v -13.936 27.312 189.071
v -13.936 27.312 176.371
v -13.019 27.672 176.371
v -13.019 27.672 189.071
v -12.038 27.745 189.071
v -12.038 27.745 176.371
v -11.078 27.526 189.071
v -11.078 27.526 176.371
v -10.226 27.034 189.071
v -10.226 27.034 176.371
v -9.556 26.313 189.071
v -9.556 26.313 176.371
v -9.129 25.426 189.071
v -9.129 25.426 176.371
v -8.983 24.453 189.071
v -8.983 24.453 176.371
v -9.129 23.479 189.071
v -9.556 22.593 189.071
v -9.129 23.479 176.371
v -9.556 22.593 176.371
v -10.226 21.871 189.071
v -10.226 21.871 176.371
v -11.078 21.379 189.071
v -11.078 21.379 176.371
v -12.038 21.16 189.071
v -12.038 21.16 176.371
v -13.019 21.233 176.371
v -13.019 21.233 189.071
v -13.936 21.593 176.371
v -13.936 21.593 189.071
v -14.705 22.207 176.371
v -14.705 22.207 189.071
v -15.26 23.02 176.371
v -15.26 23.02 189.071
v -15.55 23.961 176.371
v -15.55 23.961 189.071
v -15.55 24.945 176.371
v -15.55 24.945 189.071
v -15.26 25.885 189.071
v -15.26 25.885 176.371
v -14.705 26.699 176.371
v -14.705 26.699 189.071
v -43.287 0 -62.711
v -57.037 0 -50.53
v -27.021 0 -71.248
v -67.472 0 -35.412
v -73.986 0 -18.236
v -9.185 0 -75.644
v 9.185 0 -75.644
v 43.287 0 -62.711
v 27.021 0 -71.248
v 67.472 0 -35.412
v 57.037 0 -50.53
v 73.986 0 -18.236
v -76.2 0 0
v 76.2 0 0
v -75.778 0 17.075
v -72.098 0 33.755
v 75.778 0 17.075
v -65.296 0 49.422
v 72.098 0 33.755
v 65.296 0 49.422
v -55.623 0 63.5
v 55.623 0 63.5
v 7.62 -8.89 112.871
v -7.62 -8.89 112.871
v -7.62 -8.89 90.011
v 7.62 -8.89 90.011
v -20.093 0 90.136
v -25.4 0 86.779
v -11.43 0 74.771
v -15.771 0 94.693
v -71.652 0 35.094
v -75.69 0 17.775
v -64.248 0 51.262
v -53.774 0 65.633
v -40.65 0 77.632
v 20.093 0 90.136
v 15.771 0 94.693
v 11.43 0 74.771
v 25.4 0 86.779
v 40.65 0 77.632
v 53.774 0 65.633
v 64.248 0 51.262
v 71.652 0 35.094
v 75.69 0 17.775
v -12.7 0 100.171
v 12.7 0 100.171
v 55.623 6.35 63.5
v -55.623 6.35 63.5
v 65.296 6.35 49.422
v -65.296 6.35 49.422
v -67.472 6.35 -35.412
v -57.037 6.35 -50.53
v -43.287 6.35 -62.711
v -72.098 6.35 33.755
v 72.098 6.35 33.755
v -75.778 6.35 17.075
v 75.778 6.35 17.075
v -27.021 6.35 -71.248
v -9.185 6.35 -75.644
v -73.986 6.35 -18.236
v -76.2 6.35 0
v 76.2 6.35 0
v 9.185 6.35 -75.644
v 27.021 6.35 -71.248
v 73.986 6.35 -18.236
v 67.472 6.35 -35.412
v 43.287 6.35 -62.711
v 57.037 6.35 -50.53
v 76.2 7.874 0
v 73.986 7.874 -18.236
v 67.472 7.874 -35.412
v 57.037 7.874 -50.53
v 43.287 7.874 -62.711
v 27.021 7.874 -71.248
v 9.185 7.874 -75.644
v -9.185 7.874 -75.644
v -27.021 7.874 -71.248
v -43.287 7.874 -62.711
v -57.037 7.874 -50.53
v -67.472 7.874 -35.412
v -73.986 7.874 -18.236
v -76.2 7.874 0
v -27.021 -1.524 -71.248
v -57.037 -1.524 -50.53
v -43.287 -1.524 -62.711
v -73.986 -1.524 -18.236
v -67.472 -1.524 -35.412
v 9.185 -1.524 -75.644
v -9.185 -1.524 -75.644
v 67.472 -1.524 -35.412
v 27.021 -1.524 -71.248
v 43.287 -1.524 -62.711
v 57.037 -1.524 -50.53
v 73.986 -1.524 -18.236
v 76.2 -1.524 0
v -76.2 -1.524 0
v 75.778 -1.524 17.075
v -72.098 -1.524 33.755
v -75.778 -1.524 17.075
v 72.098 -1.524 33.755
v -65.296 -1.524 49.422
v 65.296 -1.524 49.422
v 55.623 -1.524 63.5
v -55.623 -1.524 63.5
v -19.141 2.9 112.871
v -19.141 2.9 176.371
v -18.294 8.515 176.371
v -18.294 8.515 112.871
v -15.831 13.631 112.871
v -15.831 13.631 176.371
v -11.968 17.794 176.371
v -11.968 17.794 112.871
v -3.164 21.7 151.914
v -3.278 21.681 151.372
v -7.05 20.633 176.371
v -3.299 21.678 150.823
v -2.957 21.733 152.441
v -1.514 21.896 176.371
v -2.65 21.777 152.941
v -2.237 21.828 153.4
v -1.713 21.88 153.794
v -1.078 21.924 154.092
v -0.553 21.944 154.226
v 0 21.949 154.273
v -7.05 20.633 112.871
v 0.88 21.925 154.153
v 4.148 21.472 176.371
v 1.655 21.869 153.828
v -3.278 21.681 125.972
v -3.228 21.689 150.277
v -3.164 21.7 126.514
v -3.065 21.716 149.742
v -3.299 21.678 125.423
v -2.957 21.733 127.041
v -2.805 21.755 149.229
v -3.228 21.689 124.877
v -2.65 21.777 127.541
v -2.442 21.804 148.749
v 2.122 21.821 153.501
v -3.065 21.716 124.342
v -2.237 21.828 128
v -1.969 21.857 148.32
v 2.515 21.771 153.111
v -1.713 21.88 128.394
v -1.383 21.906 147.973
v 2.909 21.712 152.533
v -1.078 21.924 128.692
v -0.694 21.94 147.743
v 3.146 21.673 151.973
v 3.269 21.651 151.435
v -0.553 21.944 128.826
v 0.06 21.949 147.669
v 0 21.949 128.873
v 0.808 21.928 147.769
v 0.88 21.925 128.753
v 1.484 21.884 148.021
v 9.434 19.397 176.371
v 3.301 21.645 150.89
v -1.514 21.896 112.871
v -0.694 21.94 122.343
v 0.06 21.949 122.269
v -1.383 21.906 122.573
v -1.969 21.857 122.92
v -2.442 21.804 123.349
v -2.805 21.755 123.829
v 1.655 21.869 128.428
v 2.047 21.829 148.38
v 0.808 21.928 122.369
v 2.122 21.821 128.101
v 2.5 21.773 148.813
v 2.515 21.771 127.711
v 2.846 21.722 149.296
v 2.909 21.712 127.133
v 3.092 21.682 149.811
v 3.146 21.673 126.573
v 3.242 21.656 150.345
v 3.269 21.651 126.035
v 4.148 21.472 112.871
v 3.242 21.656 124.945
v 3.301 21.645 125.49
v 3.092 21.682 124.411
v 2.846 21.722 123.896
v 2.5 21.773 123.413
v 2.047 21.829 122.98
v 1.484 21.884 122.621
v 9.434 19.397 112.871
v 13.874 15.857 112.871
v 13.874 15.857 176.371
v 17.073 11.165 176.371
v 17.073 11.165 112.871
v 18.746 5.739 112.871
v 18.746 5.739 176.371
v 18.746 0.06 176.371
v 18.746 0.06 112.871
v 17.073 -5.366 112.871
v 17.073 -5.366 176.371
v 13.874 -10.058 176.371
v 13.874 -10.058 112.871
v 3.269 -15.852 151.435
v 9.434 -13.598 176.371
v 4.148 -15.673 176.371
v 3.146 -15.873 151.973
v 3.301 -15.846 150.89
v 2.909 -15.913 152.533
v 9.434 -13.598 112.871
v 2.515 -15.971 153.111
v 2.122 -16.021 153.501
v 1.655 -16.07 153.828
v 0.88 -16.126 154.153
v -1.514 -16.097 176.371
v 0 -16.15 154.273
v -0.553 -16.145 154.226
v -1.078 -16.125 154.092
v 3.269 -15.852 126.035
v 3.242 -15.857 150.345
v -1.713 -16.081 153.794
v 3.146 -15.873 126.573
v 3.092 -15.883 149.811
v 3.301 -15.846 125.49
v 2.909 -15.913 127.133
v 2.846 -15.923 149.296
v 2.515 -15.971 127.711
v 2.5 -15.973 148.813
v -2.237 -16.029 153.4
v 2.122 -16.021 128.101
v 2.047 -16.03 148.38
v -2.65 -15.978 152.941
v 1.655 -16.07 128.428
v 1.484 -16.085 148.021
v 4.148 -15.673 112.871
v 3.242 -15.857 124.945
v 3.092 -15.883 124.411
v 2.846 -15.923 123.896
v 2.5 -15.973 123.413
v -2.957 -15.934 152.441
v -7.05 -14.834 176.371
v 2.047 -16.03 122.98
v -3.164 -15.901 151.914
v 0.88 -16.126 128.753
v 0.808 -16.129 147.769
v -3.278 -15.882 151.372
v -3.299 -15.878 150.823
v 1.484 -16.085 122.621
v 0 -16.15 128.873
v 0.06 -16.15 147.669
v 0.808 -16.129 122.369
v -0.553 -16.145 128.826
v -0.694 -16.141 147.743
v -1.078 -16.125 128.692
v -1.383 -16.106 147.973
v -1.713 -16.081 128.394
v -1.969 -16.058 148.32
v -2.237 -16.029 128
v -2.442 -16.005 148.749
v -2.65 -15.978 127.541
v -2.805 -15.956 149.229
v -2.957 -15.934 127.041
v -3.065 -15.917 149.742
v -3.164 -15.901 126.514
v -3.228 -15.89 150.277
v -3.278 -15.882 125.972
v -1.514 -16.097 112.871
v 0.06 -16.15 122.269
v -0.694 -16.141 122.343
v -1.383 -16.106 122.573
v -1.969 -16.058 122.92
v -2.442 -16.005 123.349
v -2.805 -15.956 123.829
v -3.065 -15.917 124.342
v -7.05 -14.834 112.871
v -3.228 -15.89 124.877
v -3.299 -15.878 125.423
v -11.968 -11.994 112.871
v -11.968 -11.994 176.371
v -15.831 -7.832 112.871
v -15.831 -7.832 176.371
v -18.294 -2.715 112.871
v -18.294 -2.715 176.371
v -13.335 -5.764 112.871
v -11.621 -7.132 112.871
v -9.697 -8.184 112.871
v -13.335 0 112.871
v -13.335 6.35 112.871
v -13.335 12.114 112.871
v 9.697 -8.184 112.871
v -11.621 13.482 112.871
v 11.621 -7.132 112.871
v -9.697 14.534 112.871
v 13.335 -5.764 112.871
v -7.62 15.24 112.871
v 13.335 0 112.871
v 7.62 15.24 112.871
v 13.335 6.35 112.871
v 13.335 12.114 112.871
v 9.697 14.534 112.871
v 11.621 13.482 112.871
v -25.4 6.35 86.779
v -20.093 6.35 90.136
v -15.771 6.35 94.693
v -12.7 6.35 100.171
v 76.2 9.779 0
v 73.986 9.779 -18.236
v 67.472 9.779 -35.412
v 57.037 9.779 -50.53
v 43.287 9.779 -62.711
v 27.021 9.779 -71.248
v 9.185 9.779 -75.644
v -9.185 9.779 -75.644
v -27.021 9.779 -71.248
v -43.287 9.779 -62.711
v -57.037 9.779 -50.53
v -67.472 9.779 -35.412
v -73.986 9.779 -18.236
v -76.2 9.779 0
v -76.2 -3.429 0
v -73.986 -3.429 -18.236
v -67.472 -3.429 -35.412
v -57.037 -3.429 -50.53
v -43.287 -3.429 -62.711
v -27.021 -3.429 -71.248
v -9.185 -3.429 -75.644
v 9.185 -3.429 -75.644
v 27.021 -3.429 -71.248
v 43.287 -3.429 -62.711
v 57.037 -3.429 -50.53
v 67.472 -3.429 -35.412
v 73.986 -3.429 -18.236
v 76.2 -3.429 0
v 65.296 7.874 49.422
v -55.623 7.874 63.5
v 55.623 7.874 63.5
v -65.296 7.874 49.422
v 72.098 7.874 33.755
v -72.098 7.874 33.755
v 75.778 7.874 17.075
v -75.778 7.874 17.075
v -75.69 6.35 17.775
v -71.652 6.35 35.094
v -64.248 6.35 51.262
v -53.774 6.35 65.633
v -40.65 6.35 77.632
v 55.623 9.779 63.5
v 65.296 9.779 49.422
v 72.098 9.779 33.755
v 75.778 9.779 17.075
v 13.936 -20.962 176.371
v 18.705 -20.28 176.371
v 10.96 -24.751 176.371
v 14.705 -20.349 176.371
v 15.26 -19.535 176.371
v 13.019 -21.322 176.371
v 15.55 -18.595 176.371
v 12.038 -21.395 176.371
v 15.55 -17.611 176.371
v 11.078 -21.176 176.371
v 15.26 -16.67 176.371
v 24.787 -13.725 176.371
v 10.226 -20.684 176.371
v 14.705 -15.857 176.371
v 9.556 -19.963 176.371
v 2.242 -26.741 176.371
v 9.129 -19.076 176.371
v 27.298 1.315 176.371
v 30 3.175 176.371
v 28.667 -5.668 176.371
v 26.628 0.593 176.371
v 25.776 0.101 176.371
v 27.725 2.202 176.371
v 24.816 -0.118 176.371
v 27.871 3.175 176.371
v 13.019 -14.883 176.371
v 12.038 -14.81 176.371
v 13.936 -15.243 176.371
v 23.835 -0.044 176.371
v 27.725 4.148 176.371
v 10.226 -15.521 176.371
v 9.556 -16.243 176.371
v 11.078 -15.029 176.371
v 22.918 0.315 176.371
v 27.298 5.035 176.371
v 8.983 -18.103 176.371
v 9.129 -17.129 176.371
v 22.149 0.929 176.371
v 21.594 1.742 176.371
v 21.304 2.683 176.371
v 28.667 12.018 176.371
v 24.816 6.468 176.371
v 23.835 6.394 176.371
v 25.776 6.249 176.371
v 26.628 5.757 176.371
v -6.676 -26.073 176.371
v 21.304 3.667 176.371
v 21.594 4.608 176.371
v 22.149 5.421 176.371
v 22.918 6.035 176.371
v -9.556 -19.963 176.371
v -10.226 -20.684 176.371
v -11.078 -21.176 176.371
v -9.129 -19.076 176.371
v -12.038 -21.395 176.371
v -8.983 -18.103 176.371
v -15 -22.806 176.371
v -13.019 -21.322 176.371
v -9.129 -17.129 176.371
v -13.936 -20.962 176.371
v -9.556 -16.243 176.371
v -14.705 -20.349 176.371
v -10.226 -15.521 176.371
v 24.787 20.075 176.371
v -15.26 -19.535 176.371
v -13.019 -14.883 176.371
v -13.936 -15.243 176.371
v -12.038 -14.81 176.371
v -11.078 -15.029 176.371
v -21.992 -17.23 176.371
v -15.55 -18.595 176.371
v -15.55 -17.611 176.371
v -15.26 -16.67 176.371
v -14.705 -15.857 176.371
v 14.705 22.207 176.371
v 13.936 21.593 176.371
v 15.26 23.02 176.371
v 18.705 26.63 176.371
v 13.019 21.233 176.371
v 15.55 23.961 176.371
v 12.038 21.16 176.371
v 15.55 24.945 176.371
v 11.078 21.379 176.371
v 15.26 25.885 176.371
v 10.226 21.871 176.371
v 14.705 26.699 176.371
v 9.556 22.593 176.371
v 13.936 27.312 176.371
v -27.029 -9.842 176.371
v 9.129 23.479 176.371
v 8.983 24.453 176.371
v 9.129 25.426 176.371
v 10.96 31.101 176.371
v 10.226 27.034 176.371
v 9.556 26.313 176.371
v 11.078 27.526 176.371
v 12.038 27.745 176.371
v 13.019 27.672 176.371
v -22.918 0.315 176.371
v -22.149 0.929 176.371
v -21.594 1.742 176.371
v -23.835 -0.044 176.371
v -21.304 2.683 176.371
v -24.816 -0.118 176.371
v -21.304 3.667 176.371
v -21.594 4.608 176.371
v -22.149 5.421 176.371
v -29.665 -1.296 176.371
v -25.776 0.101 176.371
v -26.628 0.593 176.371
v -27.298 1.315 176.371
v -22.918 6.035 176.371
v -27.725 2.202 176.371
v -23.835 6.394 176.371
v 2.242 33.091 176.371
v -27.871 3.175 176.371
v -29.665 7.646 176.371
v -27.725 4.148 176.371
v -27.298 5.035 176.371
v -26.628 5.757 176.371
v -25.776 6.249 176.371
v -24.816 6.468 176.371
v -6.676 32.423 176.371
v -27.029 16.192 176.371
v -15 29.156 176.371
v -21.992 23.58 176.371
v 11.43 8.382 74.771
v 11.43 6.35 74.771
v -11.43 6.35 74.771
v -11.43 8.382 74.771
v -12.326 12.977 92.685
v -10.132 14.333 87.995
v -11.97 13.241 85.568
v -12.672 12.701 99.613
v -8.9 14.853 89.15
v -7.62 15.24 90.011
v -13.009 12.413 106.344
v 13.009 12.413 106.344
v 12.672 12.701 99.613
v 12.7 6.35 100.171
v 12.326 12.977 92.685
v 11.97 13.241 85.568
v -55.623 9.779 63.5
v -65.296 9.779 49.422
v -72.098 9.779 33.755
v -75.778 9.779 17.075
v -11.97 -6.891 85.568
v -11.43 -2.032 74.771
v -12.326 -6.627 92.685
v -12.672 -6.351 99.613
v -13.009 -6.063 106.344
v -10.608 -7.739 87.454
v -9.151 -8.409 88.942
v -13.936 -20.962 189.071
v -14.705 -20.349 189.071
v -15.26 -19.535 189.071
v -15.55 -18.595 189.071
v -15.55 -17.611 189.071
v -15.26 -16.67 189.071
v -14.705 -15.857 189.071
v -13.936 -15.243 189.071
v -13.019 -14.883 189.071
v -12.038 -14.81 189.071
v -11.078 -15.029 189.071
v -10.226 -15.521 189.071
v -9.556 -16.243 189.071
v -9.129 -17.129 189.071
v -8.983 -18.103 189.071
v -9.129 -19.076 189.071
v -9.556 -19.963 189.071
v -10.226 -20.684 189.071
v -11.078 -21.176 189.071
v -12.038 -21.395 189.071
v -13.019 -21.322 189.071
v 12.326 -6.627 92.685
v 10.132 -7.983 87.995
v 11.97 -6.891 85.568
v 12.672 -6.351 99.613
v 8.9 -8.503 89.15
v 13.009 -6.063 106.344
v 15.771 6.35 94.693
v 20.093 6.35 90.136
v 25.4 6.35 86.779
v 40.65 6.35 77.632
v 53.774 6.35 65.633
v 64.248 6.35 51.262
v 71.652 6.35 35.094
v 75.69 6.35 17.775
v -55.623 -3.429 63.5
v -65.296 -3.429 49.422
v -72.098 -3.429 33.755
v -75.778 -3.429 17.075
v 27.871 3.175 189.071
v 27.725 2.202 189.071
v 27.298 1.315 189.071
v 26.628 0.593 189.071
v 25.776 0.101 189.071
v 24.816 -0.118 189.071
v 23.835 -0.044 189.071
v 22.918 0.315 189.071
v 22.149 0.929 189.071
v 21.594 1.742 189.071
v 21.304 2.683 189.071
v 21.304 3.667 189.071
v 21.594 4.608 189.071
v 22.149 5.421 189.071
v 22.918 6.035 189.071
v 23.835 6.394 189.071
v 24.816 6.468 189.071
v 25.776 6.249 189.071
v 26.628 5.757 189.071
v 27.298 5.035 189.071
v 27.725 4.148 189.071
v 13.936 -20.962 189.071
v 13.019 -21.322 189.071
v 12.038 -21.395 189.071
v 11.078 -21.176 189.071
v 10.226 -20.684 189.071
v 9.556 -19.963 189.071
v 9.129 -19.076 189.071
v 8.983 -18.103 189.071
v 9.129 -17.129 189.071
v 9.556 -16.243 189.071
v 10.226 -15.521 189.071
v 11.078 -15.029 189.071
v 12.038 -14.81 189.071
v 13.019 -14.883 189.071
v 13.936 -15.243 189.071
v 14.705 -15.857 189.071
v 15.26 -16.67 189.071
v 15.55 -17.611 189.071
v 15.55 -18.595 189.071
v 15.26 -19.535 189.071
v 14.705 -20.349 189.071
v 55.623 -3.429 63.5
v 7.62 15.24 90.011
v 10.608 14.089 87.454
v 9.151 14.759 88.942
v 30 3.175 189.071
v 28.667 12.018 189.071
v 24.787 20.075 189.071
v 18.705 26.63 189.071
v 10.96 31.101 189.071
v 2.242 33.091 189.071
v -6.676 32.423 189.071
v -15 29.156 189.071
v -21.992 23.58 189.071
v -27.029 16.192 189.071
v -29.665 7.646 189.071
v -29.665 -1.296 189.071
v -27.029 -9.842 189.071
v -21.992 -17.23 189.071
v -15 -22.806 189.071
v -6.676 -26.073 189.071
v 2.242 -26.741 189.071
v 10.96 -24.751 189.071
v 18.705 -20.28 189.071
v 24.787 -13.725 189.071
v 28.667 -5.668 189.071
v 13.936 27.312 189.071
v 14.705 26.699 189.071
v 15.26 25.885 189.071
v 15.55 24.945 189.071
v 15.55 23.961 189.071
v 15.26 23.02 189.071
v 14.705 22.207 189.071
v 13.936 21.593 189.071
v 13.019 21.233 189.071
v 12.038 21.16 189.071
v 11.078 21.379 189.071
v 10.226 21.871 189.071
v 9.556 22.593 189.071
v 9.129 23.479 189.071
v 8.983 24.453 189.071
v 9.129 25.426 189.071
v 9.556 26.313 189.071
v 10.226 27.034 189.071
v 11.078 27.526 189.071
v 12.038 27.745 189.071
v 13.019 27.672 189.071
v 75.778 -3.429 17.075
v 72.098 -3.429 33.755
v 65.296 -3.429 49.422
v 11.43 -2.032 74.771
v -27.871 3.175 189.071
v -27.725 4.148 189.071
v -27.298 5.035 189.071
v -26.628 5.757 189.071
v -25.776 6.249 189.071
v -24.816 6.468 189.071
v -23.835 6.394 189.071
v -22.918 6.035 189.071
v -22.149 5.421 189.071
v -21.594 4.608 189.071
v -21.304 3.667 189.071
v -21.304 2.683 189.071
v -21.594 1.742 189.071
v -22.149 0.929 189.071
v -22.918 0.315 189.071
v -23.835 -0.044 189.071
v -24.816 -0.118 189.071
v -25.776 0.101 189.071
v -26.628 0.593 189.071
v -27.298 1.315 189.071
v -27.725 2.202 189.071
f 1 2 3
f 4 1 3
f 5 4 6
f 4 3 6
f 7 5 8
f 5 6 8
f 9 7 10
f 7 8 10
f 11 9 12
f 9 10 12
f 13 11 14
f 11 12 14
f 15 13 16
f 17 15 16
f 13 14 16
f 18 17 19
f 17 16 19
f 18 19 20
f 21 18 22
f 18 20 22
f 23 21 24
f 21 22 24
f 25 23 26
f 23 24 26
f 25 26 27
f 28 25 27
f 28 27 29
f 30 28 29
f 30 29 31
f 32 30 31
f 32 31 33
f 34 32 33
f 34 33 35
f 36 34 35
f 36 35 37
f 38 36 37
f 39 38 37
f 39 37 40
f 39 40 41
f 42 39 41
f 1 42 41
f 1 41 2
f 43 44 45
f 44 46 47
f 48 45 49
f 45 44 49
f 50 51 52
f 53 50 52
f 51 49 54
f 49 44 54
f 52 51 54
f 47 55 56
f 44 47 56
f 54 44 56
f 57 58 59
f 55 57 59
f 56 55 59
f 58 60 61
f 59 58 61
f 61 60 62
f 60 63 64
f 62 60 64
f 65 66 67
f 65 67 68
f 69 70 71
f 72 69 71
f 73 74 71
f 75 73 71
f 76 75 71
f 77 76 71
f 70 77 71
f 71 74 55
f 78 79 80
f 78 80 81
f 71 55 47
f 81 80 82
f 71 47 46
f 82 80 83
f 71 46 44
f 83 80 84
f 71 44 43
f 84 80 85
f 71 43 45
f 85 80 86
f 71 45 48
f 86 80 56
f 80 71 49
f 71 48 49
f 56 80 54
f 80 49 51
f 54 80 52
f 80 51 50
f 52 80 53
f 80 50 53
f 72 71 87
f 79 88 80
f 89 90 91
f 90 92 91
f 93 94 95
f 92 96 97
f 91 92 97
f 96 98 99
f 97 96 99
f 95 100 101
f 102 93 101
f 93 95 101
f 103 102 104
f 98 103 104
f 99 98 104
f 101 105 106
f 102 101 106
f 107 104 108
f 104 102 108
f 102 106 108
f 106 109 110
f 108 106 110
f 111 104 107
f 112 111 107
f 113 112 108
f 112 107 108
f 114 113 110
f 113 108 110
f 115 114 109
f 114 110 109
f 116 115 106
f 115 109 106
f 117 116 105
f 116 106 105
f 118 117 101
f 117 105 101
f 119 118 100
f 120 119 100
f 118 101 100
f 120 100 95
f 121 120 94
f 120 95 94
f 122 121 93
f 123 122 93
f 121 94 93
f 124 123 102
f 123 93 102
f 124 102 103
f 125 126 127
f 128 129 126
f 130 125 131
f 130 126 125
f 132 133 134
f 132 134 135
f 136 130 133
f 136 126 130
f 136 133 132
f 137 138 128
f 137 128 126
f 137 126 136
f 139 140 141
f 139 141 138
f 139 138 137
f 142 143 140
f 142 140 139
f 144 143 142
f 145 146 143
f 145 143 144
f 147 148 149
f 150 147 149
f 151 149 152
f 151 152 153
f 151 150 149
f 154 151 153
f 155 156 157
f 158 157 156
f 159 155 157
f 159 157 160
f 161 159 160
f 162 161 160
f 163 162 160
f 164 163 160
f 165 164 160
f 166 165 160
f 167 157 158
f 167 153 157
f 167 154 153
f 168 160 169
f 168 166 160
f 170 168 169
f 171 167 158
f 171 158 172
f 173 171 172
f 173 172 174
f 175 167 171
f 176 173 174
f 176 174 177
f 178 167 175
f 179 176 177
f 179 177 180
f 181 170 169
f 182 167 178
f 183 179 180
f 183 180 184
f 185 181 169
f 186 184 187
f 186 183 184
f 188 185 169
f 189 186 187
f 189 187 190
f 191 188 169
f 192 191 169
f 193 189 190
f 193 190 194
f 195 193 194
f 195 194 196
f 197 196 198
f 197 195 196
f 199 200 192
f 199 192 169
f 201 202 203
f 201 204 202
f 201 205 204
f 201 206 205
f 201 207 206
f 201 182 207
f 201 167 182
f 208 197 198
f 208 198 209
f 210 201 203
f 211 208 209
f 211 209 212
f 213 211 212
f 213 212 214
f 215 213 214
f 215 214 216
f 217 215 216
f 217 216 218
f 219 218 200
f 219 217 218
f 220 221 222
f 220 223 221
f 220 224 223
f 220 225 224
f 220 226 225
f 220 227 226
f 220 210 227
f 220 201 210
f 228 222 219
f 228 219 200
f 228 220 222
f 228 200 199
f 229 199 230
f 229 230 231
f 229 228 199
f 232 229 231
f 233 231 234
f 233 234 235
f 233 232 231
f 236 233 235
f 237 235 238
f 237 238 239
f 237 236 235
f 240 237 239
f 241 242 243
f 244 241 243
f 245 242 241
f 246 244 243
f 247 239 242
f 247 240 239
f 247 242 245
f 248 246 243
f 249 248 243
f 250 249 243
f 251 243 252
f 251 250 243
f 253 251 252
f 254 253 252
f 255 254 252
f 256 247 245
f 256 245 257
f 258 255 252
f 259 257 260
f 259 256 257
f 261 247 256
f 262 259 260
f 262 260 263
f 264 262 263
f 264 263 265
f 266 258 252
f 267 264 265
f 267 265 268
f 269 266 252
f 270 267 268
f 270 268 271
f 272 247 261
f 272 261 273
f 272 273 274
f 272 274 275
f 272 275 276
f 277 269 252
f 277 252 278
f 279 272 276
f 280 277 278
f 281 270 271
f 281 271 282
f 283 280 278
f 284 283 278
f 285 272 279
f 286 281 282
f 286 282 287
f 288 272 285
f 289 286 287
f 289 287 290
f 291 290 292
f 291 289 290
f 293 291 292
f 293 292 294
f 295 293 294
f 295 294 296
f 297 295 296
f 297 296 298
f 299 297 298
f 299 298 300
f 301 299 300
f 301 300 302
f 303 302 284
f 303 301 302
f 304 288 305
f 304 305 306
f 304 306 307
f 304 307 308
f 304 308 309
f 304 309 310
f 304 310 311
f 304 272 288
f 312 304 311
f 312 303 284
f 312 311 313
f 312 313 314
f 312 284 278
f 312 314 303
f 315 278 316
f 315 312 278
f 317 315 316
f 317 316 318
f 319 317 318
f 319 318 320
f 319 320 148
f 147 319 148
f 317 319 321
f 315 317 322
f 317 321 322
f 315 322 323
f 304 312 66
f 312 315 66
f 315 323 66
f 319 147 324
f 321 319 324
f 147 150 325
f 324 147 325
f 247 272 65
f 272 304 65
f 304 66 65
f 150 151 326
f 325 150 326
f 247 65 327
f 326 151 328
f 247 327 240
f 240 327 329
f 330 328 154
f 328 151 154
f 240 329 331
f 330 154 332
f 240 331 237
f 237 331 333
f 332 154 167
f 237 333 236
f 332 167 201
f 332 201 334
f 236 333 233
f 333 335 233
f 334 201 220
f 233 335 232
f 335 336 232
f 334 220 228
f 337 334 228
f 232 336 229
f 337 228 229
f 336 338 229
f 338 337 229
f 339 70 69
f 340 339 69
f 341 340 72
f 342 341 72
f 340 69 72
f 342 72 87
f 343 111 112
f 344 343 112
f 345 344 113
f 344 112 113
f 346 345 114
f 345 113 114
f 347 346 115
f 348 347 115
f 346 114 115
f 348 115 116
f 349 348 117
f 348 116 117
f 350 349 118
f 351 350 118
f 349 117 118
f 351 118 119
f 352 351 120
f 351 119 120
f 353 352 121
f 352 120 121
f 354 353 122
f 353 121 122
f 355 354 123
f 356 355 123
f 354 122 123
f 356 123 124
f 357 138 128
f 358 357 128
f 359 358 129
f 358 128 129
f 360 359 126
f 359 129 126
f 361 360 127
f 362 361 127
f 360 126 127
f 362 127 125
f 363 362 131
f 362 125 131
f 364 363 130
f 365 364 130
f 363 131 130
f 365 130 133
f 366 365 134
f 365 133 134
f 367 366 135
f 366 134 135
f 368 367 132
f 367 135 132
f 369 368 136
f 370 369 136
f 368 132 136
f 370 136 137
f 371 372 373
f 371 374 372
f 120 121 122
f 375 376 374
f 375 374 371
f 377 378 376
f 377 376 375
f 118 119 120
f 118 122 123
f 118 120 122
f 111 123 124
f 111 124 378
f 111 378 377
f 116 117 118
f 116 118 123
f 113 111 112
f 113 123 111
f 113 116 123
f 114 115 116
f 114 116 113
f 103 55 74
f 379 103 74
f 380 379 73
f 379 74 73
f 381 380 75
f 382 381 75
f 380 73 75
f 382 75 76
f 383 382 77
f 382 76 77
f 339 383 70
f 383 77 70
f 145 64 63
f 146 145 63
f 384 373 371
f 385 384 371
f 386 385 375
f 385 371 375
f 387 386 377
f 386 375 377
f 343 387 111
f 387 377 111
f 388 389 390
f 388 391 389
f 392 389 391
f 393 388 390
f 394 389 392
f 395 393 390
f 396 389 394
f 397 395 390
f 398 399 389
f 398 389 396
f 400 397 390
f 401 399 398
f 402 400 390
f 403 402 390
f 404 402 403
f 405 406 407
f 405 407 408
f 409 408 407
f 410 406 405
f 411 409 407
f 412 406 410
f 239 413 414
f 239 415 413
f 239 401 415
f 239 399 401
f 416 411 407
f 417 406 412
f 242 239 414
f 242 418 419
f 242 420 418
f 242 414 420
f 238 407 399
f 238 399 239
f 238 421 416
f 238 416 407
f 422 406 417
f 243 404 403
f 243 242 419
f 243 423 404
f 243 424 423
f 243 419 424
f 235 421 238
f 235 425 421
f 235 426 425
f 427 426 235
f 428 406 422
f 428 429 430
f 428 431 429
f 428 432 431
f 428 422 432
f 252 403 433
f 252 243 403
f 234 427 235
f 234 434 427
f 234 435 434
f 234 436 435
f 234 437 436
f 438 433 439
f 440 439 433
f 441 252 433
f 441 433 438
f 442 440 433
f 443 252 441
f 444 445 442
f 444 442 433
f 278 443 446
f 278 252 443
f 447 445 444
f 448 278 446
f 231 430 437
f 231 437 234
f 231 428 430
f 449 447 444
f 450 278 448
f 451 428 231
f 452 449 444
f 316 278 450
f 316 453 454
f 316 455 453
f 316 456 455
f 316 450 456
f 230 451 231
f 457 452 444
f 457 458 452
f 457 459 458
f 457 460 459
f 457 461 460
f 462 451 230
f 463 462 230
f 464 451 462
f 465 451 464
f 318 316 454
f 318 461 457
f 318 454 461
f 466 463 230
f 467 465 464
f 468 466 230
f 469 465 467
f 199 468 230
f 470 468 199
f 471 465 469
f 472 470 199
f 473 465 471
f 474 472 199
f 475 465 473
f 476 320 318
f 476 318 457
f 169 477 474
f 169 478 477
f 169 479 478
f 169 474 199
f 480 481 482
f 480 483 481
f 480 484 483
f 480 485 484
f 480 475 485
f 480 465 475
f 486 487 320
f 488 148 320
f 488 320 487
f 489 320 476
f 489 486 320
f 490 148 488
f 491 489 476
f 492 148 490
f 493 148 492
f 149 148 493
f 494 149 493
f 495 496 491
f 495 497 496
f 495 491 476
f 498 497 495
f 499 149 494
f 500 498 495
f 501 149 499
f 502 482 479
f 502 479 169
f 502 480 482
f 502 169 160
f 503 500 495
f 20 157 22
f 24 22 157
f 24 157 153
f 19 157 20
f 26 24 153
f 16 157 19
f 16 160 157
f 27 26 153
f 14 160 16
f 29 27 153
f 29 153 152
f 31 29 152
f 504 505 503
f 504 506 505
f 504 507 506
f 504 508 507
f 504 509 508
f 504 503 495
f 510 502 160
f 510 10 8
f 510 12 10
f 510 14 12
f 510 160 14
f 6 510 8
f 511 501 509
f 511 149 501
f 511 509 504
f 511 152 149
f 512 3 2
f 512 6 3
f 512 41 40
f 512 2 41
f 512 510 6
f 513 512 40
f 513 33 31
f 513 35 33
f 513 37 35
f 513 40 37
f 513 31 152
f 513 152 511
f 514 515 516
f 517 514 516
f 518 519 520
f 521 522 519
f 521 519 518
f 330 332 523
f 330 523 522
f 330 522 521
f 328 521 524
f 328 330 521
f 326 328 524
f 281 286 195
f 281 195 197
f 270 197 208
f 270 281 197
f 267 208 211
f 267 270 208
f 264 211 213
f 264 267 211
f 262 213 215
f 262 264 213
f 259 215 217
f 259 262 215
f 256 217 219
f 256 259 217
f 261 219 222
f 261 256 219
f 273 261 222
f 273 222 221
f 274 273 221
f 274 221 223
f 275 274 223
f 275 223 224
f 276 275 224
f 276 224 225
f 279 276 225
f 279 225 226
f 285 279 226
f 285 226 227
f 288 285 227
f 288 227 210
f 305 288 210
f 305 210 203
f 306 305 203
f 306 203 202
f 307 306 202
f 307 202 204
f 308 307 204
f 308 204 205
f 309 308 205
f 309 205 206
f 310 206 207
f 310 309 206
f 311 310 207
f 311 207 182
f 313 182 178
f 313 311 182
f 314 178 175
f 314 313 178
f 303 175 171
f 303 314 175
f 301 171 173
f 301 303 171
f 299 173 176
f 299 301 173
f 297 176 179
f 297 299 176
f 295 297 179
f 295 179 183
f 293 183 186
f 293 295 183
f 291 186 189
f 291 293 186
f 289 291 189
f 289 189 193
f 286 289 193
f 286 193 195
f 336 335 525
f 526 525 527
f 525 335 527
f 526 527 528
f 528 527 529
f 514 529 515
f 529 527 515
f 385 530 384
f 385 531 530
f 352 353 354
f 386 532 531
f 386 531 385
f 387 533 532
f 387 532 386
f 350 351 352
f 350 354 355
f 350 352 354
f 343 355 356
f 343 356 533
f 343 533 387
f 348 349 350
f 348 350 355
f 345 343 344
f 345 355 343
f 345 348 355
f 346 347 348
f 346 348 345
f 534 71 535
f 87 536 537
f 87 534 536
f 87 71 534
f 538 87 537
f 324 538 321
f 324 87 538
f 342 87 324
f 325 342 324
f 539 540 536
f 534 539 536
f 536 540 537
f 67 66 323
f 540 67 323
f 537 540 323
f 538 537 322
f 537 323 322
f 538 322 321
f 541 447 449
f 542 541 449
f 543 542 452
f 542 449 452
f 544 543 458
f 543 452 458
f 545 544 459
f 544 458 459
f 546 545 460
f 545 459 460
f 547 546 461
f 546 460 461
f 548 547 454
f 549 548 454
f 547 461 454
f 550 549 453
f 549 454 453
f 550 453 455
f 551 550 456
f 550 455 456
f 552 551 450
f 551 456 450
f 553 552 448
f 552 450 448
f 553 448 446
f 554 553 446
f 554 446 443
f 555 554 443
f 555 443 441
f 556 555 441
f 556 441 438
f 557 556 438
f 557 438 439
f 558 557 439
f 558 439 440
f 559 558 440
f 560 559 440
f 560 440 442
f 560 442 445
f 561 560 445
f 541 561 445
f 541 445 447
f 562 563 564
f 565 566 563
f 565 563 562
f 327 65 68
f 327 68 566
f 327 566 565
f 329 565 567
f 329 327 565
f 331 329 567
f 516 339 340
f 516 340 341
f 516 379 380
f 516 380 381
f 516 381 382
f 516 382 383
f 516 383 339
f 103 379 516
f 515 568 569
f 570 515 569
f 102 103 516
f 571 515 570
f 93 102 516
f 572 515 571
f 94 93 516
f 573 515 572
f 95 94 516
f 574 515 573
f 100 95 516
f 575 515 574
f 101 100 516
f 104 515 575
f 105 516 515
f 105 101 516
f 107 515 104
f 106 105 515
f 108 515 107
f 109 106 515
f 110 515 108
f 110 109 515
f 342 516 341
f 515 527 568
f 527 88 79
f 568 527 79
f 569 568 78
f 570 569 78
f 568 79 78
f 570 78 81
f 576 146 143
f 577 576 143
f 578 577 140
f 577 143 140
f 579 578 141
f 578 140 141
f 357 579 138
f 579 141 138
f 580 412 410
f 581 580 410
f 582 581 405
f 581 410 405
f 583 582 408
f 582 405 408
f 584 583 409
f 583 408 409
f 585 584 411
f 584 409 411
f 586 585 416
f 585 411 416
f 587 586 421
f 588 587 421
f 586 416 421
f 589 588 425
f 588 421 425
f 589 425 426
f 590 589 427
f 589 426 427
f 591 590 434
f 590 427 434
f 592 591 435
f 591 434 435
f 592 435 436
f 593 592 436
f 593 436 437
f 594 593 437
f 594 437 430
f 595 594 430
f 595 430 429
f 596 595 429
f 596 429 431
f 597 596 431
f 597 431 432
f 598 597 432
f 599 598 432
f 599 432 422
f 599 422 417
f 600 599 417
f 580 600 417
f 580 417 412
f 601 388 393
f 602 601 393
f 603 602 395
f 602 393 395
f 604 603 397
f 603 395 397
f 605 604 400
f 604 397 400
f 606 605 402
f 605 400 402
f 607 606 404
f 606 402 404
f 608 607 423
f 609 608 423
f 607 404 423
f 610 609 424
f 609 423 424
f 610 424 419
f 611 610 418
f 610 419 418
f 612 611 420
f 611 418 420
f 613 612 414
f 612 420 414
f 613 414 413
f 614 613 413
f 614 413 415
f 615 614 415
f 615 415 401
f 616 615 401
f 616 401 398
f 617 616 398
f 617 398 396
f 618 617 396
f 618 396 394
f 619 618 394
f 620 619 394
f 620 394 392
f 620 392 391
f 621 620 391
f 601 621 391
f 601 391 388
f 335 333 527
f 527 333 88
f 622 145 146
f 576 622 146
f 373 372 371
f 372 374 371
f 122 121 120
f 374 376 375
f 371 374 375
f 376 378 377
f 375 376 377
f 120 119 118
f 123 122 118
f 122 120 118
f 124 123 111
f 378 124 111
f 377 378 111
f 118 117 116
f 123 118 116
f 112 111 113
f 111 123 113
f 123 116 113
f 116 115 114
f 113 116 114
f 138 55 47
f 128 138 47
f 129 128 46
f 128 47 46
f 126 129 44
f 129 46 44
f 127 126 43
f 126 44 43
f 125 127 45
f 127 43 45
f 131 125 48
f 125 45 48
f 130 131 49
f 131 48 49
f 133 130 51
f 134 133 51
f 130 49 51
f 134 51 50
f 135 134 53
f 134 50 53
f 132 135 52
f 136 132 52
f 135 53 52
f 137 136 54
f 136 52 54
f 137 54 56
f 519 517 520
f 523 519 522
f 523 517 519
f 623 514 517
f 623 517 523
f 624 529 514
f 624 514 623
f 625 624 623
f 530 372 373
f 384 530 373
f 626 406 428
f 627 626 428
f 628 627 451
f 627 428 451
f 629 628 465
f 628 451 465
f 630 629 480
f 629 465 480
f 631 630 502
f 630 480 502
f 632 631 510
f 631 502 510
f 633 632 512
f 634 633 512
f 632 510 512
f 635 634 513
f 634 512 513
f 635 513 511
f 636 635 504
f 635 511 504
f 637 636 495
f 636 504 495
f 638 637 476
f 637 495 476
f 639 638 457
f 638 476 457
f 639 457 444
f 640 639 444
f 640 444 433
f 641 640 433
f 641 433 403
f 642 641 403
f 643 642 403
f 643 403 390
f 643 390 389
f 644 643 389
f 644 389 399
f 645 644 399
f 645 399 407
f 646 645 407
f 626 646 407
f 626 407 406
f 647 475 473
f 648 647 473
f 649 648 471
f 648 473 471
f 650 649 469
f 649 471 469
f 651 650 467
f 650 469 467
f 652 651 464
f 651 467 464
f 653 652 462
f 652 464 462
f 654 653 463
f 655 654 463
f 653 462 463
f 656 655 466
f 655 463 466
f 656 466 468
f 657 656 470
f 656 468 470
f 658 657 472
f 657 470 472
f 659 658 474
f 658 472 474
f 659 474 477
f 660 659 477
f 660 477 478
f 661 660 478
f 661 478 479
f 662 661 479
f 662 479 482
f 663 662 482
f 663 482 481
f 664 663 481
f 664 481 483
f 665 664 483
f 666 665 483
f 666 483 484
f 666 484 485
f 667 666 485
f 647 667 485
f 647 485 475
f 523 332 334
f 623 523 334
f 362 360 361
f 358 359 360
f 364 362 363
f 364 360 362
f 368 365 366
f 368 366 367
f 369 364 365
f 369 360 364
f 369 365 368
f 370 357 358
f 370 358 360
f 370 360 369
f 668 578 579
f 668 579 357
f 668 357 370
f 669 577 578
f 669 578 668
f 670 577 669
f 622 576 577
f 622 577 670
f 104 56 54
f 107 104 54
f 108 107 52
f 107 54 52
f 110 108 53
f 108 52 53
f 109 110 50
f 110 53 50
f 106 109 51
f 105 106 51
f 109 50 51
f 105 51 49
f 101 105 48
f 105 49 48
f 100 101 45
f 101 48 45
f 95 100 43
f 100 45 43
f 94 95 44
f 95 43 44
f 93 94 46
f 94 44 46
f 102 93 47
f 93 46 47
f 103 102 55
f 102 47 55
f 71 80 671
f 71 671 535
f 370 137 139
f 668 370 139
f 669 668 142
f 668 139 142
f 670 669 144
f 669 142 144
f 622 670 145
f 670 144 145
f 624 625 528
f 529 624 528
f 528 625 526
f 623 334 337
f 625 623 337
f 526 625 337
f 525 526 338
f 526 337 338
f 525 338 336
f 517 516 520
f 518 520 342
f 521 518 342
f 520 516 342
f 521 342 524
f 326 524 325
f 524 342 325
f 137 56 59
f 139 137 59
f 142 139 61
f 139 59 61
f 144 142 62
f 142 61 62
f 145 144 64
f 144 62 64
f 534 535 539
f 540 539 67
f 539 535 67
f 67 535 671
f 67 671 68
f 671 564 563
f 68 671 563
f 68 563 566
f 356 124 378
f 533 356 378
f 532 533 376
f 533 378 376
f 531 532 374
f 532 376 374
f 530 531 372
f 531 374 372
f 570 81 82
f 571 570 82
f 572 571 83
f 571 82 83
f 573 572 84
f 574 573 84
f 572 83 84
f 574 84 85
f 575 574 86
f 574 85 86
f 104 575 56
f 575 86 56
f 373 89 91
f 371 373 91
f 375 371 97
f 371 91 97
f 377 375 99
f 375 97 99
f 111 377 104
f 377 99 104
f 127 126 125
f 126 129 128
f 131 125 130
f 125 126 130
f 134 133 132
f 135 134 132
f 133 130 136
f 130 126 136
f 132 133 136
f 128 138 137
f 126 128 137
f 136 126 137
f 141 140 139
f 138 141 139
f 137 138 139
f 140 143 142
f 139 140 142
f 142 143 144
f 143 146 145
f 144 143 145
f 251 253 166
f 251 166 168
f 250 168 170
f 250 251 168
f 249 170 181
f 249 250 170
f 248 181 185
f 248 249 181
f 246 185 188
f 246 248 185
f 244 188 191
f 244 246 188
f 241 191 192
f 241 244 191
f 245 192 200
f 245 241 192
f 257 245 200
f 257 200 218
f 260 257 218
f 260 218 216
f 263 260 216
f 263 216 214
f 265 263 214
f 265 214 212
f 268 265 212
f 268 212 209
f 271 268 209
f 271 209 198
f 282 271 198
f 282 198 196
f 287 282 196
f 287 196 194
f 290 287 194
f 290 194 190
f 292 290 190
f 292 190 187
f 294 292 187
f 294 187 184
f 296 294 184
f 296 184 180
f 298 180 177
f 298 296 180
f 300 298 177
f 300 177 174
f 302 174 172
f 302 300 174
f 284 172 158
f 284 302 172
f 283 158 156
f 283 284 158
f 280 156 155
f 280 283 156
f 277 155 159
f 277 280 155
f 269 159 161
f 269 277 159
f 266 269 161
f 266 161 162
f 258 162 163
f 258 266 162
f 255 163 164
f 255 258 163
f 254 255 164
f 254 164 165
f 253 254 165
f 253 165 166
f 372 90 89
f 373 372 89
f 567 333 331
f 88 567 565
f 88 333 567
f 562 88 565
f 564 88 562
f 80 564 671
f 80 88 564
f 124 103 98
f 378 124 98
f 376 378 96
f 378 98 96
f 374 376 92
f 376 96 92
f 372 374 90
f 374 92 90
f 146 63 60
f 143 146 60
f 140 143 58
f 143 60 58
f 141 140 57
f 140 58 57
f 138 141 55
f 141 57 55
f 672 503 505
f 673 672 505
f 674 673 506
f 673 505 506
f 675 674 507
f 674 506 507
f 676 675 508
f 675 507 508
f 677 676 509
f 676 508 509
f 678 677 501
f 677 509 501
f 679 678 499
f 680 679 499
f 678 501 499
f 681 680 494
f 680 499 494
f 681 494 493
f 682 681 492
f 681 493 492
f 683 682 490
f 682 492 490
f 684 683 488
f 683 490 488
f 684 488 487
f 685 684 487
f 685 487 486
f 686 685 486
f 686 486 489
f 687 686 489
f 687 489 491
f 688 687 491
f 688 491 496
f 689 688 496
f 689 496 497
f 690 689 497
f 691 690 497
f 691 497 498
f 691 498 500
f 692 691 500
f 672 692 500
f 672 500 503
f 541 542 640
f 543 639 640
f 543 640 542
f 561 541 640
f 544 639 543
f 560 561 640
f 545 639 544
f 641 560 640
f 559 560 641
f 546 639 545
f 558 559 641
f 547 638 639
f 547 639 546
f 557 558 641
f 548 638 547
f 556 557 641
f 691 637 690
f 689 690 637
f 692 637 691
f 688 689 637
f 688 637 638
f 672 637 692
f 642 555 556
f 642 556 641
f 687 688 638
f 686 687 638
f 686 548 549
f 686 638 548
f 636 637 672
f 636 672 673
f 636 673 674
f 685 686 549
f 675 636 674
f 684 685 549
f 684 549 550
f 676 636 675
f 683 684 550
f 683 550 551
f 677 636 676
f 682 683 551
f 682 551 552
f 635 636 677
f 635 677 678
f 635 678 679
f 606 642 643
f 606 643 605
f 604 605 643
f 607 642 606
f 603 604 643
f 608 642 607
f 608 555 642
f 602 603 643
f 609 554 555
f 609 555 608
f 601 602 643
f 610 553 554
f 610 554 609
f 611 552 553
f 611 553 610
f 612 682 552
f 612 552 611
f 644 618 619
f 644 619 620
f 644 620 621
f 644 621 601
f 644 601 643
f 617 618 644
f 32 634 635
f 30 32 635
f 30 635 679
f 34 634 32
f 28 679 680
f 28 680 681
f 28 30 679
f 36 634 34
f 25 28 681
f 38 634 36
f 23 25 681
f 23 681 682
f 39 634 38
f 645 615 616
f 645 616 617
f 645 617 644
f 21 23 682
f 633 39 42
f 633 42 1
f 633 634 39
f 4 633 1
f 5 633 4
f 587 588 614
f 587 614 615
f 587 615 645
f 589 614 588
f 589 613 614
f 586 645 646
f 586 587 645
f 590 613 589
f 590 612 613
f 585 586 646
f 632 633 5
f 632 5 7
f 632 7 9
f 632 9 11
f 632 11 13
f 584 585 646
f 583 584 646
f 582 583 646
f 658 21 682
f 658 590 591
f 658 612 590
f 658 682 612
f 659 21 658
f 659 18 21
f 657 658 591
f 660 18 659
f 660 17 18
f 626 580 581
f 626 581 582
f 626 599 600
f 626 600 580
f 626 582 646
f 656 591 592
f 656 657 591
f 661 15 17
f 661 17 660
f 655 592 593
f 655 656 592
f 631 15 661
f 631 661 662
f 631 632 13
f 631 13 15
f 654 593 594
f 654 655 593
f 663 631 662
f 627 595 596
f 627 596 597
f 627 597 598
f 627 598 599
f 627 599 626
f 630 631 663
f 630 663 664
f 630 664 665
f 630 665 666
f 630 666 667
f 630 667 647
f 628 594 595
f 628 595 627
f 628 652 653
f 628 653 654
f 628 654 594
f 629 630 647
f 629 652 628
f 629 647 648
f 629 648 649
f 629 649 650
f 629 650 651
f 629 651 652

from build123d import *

# Parameters (mm, degrees)
BOSS_EXTRUDE1_DEPTH      = 6.35
BOSS_EXTRUDE2_DEPTH      = 1.524
BOSS_EXTRUDE4_DEPTH      = 1.905
BOSS_EXTRUDE5_DEPTH      = 1.524
BOSS_EXTRUDE6_DEPTH      = 1.905
BOSS_EXTRUDE7_DEPTH      = 8.89
CUT_EXTRUDE1_DEPTH       = 101.6
CUT_EXTRUDE2_DEPTH       = 25.4
BOSS_EXTRUDE8_DEPTH      = 12.7
BOSS_EXTRUDE8_DEPTH_BACK = 63.5
SKETCH10_R               = 30
CUT_EXTRUDE3_DEPTH       = 207.614341078
CUT_EXTRUDE3_DEPTH_BACK  = 207.614341078
SKETCH11_R               = 3.302
SKETCH12_R               = 37.410061843
SKETCH12_R_2             = 19.05
CUT_EXTRUDE4_DEPTH       = 63.5
SKETCH13_R               = 3.302
CUT_EXTRUDE6_DEPTH       = 266.958156432
CIRPATTERN1_COUNT        = 6


with BuildPart() as part:
    # Sketch2 → Boss-Extrude1 (new body)
    with BuildSketch(Plane(origin=(0, 0, 0), x_dir=(1, 0, 0), z_dir=(0, 1, 0))):
        with BuildLine():
            Line((-12.7, -100.170905775), (-16.376657923, -173.704064228))
            ThreePointArc((-16.376657923, -173.704064228), (-15.680177156, -175.581537443), (-13.839826982, -176.370905775))
            Line((-13.839826982, -176.370905775), (13.839826982, -176.370905775))
            ThreePointArc((13.839826982, -176.370905775), (15.680177156, -175.581537443), (16.376657923, -173.704064228))
            Line((16.376657923, -173.704064228), (12.7, -100.170905775))
            ThreePointArc((12.7, -100.170905775), (17.790636658, -92.280726172), (25.4, -86.779171366))
            ThreePointArc((25.4, -86.779171366), (64.24812298, -51.26203522), (76.2, 0))
            ThreePointArc((76.2, 0), (0, 76.2), (-76.2, 0))
            ThreePointArc((-76.2, 0), (-64.24812298, -51.26203522), (-25.4, -86.779171366))
            ThreePointArc((-25.4, -86.779171366), (-17.790636658, -92.280726172), (-12.7, -100.170905775))
        make_face()
    extrude(amount=BOSS_EXTRUDE1_DEPTH)

    # Sketch7 → Boss-Extrude7 (add)
    with BuildSketch(Plane(origin=(0, 6.35, 0), x_dir=(1, 0, 0), z_dir=(0, 1, 0))):
        with BuildLine():
            Line((-11.43, -74.770905775), (-16.376657923, -173.704064228))
            ThreePointArc((-16.376657923, -173.704064228), (-15.680177156, -175.581537443), (-13.839826982, -176.370905775))
            Line((-13.839826982, -176.370905775), (13.839826982, -176.370905775))
            ThreePointArc((13.839826982, -176.370905775), (15.680177156, -175.581537443), (16.376657923, -173.704064228))
            Line((16.376657923, -173.704064228), (11.43, -74.770905775))
            Line((11.43, -74.770905775), (-11.43, -74.770905775))
        make_face()
    boss_extrude7 = extrude(amount=BOSS_EXTRUDE7_DEPTH)

    # Sketch8 → Cut-Extrude1 (cut)
    with BuildSketch(Plane.XY.offset(176.370905775)):
        with BuildLine():
            Line((-13.839826982, 15.24), (-7.62, 15.24))
            ThreePointArc((-7.62, 15.24), (-12.921650252, 12.489613458), (-16.379826982, 7.62))
            Line((-16.379826982, 7.62), (-16.379826982, 15.24))
            Line((-16.379826982, 15.24), (-13.839826982, 15.24))
        make_face()
        with BuildLine():
            Line((16.379826982, 15.24), (13.839826982, 15.24))
            Line((13.839826982, 15.24), (7.62, 15.24))
            ThreePointArc((7.62, 15.24), (12.921650252, 12.489613458), (16.379826982, 7.62))
            Line((16.379826982, 7.62), (16.379826982, 15.24))
        make_face()
    cut_extrude1 = extrude(amount=-CUT_EXTRUDE1_DEPTH, mode=Mode.SUBTRACT)

    # Sketch9 → Cut-Extrude2 (cut, symmetric)
    with BuildSketch(Plane(origin=(0, 0, -0.19192658), x_dir=(0, 0, -1), z_dir=(1, 0, 0))):
        Polygon((-74.962832355, 8.382), (-90.202832355, 15.24), (-74.962832355, 15.24), align=None)
    cut_extrude2 = extrude(amount=CUT_EXTRUDE2_DEPTH, both=True, mode=Mode.SUBTRACT)

    # Mirror8: Boss-Extrude7, Cut-Extrude1, Cut-Extrude2 across plane
    add(boss_extrude7.mirror(Plane.ZX.offset(3.175)))
    add(cut_extrude1.mirror(Plane.ZX.offset(3.175)), mode=Mode.SUBTRACT)
    add(cut_extrude2.mirror(Plane.ZX.offset(3.175)), mode=Mode.SUBTRACT)

    # Sketch10 → Boss-Extrude8 (add, two sides: drawn at the far end of the back side and taken through both)
    with BuildSketch(Plane.XY.offset(176.370905775).offset(-BOSS_EXTRUDE8_DEPTH_BACK)):
        with Locations((0, 3.175)):
            Circle(SKETCH10_R)
    extrude(amount=BOSS_EXTRUDE8_DEPTH + BOSS_EXTRUDE8_DEPTH_BACK)

    # Sketch11 → Cut-Extrude3 (cut, two sides: drawn at the far end of the back side and taken through both)
    with BuildSketch(Plane(origin=(0, 0, 0), x_dir=(1, 0, 0), z_dir=(0, 1, 0)).offset(-CUT_EXTRUDE3_DEPTH_BACK)):
        with Locations((0, -125.570905775)):
            Circle(SKETCH11_R)
        with Locations((0, -150.970905775)):
            Circle(SKETCH11_R)
    extrude(amount=CUT_EXTRUDE3_DEPTH + CUT_EXTRUDE3_DEPTH_BACK, mode=Mode.SUBTRACT)

    # Sketch12 → Cut-Extrude4 (cut)
    with BuildSketch(Plane(origin=(0, 0, 112.870905775), x_dir=(-1, 0, 0), z_dir=(0, 0, -1))):
        with Locations((0.090742593, 2.899627676)):
            Circle(SKETCH12_R)
        with Locations((0.090742593, 2.899627676)):
            Circle(SKETCH12_R_2, mode=Mode.SUBTRACT)
    extrude(amount=-CUT_EXTRUDE4_DEPTH, mode=Mode.SUBTRACT)

    # Sketch13 → Cut-Extrude6 (cut, through all)
    with BuildSketch(Plane(origin=(0, 0, 176.370905775), x_dir=(-1, 0, 0), z_dir=(0, 0, -1))):
        with Locations((24.569376101, 3.175)):
            Circle(SKETCH13_R)
    cut_extrude6 = extrude(amount=-CUT_EXTRUDE6_DEPTH, mode=Mode.SUBTRACT)

    # CirPattern1: Cut-Extrude6 ×6 about axis
    cirpattern1_axis = Axis((0, 3.175, 176.370905775), (0, 0, 1))
    for i in range(1, CIRPATTERN1_COUNT):
        add(cut_extrude6.rotate(cirpattern1_axis, i * 360 / CIRPATTERN1_COUNT), mode=Mode.SUBTRACT)


with BuildPart() as body_2:
    # Sketch3 → Boss-Extrude2 (new body)
    with BuildSketch(Plane(origin=(0, 6.35, 0), x_dir=(1, 0, 0), z_dir=(0, 1, 0))):
        with BuildLine():
            Line((-55.623239344, -63.5), (55.623239344, -63.5))
            ThreePointArc((55.623239344, -63.5), (72.09775167, -33.754575709), (76.2, 0))
            ThreePointArc((76.2, 0), (0, 76.2), (-76.2, 0))
            ThreePointArc((-76.2, 0), (-72.09775167, -33.754575709), (-55.623239344, -63.5))
        make_face()
    extrude(amount=BOSS_EXTRUDE2_DEPTH)


with BuildPart() as body_3:
    # Sketch4 → Boss-Extrude4 (new body)
    with BuildSketch(Plane(origin=(0, 7.874, 0), x_dir=(1, 0, 0), z_dir=(0, 1, 0))):
        with BuildLine():
            Line((-55.623239344, -63.5), (55.623239344, -63.5))
            ThreePointArc((55.623239344, -63.5), (72.09775167, -33.754575709), (76.2, 0))
            ThreePointArc((76.2, 0), (0, 76.2), (-76.2, 0))
            ThreePointArc((-76.2, 0), (-72.09775167, -33.754575709), (-55.623239344, -63.5))
        make_face()
    extrude(amount=BOSS_EXTRUDE4_DEPTH)


with BuildPart() as body_4:
    # Sketch5 → Boss-Extrude5 (new body)
    with BuildSketch(Plane.XZ):
        with BuildLine():
            Line((55.623239344, 63.5), (-55.623239344, 63.5))
            ThreePointArc((-55.623239344, 63.5), (-72.09775167, 33.754575709), (-76.2, 0))
            ThreePointArc((-76.2, 0), (0, -76.2), (76.2, 0))
            ThreePointArc((76.2, 0), (72.09775167, 33.754575709), (55.623239344, 63.5))
        make_face()
    extrude(amount=BOSS_EXTRUDE5_DEPTH)


with BuildPart() as body_5:
    # Sketch6 → Boss-Extrude6 (new body)
    with BuildSketch(Plane.XZ.offset(1.524)):
        with BuildLine():
            Line((55.623239344, 63.5), (-55.623239344, 63.5))
            ThreePointArc((-55.623239344, 63.5), (-72.09775167, 33.754575709), (-76.2, 0))
            ThreePointArc((-76.2, 0), (0, -76.2), (76.2, 0))
            ThreePointArc((76.2, 0), (72.09775167, 33.754575709), (55.623239344, 63.5))
        make_face()
    extrude(amount=BOSS_EXTRUDE6_DEPTH)


solid = Compound([part.part, body_2.part, body_3.part, body_4.part, body_5.part])
